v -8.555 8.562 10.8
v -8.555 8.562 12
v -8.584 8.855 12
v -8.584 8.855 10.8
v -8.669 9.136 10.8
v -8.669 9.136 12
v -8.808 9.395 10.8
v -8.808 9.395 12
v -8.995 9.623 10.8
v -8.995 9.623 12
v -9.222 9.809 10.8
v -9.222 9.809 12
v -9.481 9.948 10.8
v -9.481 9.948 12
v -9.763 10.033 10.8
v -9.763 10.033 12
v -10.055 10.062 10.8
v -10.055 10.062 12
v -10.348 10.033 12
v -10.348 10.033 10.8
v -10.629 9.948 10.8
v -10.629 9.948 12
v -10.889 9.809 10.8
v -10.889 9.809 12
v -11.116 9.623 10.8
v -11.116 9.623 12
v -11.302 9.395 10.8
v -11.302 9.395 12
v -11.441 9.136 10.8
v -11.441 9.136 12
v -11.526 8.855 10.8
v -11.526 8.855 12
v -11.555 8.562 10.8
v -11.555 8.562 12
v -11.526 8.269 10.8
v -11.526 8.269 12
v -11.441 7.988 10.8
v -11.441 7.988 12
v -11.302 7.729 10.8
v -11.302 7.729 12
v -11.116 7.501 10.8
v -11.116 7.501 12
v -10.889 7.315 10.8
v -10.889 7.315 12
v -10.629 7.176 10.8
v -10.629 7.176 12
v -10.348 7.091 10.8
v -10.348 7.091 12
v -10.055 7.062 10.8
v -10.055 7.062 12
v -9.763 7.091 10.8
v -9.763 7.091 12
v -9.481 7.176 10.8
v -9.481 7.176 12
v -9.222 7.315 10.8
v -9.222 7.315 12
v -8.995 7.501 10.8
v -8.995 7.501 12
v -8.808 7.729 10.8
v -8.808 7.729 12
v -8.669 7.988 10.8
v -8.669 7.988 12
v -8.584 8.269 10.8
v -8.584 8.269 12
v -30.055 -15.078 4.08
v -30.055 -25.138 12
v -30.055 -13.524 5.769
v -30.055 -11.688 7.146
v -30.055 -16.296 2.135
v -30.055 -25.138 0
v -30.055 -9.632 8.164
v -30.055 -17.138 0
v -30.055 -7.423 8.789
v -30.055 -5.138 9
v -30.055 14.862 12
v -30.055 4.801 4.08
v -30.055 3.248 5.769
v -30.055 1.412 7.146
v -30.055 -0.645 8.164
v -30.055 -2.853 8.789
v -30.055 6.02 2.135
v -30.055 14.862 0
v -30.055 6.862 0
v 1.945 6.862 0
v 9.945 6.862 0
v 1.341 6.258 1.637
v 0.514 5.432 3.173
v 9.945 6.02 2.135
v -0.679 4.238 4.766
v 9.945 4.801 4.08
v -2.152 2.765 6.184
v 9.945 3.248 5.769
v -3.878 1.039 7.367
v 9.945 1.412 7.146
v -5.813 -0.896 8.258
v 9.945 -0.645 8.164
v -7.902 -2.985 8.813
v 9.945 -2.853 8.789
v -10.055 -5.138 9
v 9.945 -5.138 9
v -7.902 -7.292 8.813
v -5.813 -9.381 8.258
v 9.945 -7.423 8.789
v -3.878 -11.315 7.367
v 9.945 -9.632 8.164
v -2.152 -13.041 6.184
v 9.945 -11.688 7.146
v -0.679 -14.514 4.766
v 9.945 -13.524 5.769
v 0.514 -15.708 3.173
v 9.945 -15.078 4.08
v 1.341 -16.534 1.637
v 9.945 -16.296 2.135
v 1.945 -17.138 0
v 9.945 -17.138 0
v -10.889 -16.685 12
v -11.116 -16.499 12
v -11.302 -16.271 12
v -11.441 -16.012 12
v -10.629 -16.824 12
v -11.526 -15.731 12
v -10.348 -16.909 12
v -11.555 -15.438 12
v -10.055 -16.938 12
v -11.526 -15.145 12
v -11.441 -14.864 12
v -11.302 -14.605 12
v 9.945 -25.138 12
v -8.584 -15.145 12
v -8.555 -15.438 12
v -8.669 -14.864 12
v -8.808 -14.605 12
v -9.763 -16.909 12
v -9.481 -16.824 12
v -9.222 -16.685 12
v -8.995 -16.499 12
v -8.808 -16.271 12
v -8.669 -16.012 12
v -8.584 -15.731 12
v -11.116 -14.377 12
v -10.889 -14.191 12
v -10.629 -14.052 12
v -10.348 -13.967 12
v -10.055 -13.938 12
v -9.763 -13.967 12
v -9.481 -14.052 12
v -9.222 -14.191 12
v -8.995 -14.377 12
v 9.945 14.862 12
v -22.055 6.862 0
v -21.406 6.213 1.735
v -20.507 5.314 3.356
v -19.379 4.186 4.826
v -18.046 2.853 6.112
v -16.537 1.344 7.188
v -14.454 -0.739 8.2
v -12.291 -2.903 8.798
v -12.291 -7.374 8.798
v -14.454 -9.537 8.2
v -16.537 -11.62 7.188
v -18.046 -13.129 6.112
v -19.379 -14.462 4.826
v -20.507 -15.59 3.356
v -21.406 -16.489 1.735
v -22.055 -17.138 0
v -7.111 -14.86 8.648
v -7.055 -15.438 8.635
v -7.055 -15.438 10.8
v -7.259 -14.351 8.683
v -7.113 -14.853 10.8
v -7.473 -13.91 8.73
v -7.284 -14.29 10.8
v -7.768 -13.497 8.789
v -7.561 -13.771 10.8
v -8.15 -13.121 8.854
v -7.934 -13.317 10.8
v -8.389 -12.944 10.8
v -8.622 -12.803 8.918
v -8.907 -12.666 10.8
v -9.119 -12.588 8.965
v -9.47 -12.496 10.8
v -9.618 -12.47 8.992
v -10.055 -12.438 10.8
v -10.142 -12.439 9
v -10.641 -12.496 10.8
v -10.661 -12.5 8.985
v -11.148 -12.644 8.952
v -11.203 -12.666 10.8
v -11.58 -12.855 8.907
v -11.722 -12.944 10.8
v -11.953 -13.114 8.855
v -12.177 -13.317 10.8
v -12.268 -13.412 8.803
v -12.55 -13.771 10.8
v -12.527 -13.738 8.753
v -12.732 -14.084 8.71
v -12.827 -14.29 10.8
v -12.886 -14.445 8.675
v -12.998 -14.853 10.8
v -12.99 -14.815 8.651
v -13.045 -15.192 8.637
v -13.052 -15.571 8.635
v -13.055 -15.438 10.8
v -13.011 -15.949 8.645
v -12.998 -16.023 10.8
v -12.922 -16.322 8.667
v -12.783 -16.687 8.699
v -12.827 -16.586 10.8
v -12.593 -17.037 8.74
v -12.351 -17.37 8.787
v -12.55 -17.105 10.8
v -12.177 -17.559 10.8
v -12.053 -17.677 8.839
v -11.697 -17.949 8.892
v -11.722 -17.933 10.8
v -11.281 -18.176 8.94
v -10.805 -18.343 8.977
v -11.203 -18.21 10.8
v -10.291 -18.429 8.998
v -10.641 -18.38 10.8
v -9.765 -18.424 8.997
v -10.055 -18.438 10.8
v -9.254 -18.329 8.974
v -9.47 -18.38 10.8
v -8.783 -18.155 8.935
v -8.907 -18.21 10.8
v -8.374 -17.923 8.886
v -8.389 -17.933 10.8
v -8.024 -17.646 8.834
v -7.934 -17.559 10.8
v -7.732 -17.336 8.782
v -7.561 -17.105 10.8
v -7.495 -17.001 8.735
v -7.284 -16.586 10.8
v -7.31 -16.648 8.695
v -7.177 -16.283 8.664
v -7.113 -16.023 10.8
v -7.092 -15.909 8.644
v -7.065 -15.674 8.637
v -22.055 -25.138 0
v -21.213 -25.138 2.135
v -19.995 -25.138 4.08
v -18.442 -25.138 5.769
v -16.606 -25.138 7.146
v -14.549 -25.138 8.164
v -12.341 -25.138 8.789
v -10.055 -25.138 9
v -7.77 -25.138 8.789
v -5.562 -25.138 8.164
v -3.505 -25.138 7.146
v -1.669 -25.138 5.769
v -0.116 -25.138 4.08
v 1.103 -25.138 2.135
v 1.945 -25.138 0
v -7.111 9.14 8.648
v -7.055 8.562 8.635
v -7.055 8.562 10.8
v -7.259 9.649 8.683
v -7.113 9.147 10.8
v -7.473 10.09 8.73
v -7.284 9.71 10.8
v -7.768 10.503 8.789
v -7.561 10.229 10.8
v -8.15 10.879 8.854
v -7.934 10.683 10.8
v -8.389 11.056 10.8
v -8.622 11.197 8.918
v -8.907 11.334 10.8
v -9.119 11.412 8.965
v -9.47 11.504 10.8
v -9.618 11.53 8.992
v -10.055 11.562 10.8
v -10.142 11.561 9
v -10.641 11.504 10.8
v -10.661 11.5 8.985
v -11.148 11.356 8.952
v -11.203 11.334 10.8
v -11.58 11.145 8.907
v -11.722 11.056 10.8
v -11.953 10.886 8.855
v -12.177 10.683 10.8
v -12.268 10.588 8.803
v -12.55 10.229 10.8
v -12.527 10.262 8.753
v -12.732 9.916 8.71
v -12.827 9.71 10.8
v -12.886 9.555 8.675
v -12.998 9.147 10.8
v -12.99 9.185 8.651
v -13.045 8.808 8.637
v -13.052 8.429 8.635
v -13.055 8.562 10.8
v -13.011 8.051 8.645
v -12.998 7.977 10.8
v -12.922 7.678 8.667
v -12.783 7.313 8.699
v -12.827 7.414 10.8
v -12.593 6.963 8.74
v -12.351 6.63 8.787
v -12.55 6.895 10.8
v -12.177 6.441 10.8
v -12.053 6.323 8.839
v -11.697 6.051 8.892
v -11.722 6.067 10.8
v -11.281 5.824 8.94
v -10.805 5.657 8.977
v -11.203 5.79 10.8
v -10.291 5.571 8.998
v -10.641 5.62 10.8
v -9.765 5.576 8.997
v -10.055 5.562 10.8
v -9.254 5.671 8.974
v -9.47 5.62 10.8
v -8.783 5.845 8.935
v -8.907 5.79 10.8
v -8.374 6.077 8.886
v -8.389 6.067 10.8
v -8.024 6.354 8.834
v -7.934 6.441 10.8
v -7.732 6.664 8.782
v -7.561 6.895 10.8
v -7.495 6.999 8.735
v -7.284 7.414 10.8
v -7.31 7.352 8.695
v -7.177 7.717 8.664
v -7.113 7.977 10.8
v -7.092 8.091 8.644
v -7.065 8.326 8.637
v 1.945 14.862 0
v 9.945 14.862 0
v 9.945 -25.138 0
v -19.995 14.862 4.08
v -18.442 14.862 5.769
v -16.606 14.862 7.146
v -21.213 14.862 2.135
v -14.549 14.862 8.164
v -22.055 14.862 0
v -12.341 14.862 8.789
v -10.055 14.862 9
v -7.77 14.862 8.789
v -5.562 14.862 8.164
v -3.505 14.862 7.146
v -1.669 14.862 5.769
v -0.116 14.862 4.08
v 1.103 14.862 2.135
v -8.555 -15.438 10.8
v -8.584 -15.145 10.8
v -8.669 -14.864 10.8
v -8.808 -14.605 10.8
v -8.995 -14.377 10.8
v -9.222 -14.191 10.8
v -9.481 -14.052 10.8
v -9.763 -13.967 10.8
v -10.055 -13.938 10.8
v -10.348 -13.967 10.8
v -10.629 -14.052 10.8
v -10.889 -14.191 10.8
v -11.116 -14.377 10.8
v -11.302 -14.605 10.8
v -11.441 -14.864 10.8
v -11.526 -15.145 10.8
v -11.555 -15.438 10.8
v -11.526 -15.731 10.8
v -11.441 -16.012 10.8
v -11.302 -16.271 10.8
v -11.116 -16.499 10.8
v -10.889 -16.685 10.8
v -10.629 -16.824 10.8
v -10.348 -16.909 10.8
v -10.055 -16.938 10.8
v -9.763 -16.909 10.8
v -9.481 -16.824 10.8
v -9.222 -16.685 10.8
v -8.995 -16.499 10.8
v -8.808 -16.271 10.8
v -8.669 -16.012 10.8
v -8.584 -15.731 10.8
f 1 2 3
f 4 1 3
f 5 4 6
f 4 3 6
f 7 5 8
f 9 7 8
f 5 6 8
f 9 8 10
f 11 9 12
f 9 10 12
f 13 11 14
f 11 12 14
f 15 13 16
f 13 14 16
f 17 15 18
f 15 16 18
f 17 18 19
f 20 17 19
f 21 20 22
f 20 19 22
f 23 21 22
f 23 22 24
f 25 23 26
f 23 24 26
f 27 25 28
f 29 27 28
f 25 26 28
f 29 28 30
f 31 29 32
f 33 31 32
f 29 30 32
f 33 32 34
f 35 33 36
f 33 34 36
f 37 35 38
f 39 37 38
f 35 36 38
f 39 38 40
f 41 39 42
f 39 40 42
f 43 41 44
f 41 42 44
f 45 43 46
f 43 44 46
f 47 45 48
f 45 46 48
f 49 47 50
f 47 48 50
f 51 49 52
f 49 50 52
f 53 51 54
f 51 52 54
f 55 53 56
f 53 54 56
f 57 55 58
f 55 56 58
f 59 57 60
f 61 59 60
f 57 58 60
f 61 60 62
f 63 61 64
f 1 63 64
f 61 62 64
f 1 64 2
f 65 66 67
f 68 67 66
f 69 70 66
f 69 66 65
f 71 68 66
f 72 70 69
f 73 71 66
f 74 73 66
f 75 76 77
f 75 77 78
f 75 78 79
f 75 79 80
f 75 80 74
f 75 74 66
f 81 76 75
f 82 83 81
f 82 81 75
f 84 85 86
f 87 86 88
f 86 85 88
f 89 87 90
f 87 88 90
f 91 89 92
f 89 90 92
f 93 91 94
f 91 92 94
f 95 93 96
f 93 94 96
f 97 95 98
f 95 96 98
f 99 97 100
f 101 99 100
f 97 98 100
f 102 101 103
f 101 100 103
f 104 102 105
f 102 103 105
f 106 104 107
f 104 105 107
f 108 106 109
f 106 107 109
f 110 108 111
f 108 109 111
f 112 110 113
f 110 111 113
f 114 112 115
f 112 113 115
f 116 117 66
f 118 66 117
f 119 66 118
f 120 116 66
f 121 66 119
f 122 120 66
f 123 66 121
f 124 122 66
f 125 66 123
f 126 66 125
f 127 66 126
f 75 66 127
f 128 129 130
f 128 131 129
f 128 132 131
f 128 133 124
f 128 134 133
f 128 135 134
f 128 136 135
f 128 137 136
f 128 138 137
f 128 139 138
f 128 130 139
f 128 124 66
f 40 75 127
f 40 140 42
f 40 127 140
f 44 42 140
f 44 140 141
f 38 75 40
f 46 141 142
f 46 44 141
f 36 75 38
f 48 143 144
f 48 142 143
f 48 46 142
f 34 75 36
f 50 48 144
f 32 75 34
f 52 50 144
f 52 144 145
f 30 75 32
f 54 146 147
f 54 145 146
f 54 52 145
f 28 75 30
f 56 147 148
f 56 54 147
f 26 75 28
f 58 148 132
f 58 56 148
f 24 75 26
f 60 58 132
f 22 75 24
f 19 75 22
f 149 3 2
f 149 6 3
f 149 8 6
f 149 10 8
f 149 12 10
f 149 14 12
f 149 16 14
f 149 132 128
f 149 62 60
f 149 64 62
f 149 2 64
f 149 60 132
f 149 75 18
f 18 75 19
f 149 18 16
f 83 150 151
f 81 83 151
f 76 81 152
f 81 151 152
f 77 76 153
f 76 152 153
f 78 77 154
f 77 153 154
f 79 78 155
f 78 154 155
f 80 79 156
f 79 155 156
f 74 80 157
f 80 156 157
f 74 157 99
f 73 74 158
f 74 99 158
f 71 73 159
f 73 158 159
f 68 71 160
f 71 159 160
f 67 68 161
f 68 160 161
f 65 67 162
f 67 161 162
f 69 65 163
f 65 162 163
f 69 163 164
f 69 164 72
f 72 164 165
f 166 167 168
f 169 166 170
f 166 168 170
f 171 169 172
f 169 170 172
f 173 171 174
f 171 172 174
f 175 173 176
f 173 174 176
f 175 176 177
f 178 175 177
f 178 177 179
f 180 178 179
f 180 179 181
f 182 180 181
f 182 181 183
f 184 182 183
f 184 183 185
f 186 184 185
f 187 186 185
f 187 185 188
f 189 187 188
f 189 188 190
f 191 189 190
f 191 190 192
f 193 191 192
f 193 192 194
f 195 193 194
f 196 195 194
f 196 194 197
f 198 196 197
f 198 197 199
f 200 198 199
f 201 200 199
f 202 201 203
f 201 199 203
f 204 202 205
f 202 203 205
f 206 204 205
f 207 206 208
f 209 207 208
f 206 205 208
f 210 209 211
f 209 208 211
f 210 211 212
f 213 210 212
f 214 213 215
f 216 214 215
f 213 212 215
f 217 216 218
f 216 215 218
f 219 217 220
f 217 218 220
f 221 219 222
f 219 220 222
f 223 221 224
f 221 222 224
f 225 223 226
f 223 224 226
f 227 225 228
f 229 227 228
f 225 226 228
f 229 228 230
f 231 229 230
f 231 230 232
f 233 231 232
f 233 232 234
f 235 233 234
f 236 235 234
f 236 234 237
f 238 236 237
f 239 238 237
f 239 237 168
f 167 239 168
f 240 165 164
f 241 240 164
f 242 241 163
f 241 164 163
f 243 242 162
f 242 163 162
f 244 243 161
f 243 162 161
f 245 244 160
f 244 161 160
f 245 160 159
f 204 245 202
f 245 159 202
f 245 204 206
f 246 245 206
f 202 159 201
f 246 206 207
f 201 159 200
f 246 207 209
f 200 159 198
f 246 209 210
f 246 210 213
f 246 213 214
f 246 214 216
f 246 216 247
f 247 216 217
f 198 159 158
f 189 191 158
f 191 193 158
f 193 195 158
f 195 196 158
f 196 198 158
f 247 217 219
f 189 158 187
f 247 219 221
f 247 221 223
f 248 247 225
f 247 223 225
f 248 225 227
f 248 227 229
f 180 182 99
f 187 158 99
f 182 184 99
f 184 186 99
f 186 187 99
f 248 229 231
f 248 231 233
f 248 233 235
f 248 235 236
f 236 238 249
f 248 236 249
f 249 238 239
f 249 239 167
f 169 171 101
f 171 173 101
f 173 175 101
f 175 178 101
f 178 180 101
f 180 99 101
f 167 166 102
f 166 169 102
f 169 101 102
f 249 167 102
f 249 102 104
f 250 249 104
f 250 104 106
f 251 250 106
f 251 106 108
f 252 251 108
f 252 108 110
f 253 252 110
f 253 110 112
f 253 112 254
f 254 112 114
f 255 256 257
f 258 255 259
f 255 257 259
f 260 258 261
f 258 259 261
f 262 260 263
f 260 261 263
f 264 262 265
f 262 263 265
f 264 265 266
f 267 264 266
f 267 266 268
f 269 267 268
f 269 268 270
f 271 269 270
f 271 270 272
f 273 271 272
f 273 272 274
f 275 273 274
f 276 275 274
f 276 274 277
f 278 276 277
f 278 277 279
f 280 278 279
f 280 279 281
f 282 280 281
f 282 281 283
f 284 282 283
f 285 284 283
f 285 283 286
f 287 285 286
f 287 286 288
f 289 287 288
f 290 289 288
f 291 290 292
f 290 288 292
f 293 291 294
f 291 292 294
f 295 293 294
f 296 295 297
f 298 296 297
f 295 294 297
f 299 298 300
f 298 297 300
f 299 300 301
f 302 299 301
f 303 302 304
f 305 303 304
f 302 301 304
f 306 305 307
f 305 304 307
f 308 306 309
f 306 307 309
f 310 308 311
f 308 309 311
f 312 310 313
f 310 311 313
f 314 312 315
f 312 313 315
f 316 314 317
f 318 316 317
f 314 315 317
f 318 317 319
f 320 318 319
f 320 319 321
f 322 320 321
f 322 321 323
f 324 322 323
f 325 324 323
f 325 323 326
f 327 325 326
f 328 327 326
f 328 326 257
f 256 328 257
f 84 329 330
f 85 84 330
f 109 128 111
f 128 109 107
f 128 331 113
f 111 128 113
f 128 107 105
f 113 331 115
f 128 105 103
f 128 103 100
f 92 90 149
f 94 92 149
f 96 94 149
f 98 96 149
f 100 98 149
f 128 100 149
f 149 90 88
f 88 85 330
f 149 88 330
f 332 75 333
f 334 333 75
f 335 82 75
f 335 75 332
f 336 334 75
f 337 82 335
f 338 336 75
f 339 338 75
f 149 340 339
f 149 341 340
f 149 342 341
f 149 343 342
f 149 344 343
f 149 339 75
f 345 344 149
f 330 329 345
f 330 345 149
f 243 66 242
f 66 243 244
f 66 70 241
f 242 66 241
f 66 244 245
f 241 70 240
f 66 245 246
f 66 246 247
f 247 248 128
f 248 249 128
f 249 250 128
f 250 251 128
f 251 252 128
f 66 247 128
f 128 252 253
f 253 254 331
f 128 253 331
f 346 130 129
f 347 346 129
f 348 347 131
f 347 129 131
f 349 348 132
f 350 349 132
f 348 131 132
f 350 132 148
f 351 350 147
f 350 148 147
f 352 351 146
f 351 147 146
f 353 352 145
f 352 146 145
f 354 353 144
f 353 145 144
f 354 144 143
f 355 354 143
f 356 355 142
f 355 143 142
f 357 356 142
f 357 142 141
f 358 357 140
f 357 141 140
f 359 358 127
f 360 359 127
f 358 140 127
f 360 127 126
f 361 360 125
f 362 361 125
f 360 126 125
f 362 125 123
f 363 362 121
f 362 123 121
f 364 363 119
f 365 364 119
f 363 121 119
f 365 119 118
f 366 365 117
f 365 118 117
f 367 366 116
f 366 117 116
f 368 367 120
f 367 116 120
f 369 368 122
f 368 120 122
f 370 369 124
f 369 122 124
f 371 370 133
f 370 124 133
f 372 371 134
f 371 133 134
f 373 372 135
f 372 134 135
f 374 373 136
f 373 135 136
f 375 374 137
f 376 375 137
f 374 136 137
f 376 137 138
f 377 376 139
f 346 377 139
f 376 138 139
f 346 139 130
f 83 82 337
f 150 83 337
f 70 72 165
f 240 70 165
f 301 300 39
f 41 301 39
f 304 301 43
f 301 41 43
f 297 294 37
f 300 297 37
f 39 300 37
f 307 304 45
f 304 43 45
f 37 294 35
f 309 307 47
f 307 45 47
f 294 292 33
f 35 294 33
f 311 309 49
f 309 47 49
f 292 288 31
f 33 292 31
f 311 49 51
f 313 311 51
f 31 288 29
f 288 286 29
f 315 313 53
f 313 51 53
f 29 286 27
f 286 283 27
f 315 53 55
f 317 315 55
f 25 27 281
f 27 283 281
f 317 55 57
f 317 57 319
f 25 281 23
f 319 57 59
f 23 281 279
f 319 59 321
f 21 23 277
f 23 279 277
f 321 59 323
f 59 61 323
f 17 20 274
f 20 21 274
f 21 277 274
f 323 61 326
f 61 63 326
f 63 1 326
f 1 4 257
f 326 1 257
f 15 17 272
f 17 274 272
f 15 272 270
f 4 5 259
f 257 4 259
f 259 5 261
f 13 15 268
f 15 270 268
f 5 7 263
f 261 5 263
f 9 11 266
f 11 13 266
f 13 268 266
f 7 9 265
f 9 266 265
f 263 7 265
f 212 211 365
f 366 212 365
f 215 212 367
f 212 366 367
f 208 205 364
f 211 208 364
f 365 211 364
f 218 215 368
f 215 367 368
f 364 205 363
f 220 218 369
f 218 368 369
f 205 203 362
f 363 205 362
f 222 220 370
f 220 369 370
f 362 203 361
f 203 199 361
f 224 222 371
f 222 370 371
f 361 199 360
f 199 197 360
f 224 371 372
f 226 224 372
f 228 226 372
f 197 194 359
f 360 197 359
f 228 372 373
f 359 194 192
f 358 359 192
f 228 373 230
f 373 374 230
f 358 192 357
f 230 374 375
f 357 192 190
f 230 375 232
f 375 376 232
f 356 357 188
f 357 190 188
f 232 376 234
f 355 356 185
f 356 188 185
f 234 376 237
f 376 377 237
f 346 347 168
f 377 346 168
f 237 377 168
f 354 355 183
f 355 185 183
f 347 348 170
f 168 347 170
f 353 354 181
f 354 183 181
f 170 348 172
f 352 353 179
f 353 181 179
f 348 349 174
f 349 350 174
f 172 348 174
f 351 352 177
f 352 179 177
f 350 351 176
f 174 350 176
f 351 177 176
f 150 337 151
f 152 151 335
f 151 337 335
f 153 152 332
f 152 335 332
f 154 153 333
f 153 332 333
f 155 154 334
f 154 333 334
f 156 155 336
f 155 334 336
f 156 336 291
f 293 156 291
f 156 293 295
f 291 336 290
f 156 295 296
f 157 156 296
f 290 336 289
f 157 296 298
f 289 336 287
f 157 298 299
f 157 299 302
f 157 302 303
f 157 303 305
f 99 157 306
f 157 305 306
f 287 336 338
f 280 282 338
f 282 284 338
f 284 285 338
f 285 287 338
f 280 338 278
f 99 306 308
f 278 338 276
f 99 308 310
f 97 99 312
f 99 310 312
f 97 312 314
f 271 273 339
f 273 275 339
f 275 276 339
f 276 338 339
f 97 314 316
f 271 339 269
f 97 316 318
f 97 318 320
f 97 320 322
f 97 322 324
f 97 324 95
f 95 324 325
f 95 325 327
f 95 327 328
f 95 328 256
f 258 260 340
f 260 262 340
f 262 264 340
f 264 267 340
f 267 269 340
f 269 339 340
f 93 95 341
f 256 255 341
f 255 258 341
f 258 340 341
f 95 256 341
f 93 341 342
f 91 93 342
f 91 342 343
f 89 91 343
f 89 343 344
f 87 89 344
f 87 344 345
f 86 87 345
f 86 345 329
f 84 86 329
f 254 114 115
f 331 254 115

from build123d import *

# Parameters (mm, degrees)
SKETCH1_W           = 40
SKETCH1_H           = 40
BOSS_EXTRUDE1_DEPTH = 12
SKETCH3_R           = 12.5
CUT_EXTRUDE3_DEPTH  = 40
SKETCH11_R          = 12.5
CUT_EXTRUDE4_DEPTH  = 40
SKETCH14_R          = 3
CUT_EXTRUDE7_DEPTH  = 30
SKETCH14_5_R        = 3
SKETCH14_5_R_2      = 1.5
BOSS_EXTRUDE2_DEPTH = 1.2


with BuildPart() as part:
    # Sketch1 → Boss-Extrude1 (new body)
    with BuildSketch(Plane.XY):
        with Locations((-10.055248619, -5.138121547)):
            Rectangle(SKETCH1_W, SKETCH1_H)
    extrude(amount=BOSS_EXTRUDE1_DEPTH)

    # Sketch3 → Cut-Extrude3 (cut)
    with BuildSketch(Plane(origin=(0, 14.861878453, 0), x_dir=(1, 0, 0), z_dir=(0, 1, 0))):
        with Locations((-10.055248619, 3.5)):
            Circle(SKETCH3_R)
    extrude(amount=-CUT_EXTRUDE3_DEPTH, mode=Mode.SUBTRACT)

    # Sketch11 → Cut-Extrude4 (cut)
    with BuildSketch(Plane(origin=(9.944751381, 0, 0), x_dir=(0, 0, -1), z_dir=(1, 0, 0))):
        with Locations((3.5, -5.138121547)):
            Circle(SKETCH11_R)
    extrude(amount=-CUT_EXTRUDE4_DEPTH, mode=Mode.SUBTRACT)

    # Sketch14 → Cut-Extrude7 (cut)
    with BuildSketch(Plane.XY.offset(12)):
        with Locations((-10.055248619, 8.561878453)):
            Circle(SKETCH14_R)
        with Locations((-10.055248619, -15.438121547)):
            Circle(SKETCH14_R)
    extrude(amount=-CUT_EXTRUDE7_DEPTH, mode=Mode.SUBTRACT)

    # Sketch14<5> → Boss-Extrude2 (add)
    # profile 1 of 2: a face of its own
    with BuildSketch(Plane.XY.offset(12)):
        with Locations((-10.055248619, 8.561878453)):
            Circle(SKETCH14_5_R)
        with Locations((-10.055248619, 8.561878453)):
            Circle(SKETCH14_5_R_2, mode=Mode.SUBTRACT)
    # profile 2 of 2: a face of its own
    with BuildSketch(Plane.XY.offset(12)):
        with Locations((-10.055248619, -15.438121547)):
            Circle(SKETCH14_5_R)
        with Locations((-10.055248619, -15.438121547)):
            Circle(SKETCH14_5_R_2, mode=Mode.SUBTRACT)
    extrude(amount=-BOSS_EXTRUDE2_DEPTH)


solid = part.part
